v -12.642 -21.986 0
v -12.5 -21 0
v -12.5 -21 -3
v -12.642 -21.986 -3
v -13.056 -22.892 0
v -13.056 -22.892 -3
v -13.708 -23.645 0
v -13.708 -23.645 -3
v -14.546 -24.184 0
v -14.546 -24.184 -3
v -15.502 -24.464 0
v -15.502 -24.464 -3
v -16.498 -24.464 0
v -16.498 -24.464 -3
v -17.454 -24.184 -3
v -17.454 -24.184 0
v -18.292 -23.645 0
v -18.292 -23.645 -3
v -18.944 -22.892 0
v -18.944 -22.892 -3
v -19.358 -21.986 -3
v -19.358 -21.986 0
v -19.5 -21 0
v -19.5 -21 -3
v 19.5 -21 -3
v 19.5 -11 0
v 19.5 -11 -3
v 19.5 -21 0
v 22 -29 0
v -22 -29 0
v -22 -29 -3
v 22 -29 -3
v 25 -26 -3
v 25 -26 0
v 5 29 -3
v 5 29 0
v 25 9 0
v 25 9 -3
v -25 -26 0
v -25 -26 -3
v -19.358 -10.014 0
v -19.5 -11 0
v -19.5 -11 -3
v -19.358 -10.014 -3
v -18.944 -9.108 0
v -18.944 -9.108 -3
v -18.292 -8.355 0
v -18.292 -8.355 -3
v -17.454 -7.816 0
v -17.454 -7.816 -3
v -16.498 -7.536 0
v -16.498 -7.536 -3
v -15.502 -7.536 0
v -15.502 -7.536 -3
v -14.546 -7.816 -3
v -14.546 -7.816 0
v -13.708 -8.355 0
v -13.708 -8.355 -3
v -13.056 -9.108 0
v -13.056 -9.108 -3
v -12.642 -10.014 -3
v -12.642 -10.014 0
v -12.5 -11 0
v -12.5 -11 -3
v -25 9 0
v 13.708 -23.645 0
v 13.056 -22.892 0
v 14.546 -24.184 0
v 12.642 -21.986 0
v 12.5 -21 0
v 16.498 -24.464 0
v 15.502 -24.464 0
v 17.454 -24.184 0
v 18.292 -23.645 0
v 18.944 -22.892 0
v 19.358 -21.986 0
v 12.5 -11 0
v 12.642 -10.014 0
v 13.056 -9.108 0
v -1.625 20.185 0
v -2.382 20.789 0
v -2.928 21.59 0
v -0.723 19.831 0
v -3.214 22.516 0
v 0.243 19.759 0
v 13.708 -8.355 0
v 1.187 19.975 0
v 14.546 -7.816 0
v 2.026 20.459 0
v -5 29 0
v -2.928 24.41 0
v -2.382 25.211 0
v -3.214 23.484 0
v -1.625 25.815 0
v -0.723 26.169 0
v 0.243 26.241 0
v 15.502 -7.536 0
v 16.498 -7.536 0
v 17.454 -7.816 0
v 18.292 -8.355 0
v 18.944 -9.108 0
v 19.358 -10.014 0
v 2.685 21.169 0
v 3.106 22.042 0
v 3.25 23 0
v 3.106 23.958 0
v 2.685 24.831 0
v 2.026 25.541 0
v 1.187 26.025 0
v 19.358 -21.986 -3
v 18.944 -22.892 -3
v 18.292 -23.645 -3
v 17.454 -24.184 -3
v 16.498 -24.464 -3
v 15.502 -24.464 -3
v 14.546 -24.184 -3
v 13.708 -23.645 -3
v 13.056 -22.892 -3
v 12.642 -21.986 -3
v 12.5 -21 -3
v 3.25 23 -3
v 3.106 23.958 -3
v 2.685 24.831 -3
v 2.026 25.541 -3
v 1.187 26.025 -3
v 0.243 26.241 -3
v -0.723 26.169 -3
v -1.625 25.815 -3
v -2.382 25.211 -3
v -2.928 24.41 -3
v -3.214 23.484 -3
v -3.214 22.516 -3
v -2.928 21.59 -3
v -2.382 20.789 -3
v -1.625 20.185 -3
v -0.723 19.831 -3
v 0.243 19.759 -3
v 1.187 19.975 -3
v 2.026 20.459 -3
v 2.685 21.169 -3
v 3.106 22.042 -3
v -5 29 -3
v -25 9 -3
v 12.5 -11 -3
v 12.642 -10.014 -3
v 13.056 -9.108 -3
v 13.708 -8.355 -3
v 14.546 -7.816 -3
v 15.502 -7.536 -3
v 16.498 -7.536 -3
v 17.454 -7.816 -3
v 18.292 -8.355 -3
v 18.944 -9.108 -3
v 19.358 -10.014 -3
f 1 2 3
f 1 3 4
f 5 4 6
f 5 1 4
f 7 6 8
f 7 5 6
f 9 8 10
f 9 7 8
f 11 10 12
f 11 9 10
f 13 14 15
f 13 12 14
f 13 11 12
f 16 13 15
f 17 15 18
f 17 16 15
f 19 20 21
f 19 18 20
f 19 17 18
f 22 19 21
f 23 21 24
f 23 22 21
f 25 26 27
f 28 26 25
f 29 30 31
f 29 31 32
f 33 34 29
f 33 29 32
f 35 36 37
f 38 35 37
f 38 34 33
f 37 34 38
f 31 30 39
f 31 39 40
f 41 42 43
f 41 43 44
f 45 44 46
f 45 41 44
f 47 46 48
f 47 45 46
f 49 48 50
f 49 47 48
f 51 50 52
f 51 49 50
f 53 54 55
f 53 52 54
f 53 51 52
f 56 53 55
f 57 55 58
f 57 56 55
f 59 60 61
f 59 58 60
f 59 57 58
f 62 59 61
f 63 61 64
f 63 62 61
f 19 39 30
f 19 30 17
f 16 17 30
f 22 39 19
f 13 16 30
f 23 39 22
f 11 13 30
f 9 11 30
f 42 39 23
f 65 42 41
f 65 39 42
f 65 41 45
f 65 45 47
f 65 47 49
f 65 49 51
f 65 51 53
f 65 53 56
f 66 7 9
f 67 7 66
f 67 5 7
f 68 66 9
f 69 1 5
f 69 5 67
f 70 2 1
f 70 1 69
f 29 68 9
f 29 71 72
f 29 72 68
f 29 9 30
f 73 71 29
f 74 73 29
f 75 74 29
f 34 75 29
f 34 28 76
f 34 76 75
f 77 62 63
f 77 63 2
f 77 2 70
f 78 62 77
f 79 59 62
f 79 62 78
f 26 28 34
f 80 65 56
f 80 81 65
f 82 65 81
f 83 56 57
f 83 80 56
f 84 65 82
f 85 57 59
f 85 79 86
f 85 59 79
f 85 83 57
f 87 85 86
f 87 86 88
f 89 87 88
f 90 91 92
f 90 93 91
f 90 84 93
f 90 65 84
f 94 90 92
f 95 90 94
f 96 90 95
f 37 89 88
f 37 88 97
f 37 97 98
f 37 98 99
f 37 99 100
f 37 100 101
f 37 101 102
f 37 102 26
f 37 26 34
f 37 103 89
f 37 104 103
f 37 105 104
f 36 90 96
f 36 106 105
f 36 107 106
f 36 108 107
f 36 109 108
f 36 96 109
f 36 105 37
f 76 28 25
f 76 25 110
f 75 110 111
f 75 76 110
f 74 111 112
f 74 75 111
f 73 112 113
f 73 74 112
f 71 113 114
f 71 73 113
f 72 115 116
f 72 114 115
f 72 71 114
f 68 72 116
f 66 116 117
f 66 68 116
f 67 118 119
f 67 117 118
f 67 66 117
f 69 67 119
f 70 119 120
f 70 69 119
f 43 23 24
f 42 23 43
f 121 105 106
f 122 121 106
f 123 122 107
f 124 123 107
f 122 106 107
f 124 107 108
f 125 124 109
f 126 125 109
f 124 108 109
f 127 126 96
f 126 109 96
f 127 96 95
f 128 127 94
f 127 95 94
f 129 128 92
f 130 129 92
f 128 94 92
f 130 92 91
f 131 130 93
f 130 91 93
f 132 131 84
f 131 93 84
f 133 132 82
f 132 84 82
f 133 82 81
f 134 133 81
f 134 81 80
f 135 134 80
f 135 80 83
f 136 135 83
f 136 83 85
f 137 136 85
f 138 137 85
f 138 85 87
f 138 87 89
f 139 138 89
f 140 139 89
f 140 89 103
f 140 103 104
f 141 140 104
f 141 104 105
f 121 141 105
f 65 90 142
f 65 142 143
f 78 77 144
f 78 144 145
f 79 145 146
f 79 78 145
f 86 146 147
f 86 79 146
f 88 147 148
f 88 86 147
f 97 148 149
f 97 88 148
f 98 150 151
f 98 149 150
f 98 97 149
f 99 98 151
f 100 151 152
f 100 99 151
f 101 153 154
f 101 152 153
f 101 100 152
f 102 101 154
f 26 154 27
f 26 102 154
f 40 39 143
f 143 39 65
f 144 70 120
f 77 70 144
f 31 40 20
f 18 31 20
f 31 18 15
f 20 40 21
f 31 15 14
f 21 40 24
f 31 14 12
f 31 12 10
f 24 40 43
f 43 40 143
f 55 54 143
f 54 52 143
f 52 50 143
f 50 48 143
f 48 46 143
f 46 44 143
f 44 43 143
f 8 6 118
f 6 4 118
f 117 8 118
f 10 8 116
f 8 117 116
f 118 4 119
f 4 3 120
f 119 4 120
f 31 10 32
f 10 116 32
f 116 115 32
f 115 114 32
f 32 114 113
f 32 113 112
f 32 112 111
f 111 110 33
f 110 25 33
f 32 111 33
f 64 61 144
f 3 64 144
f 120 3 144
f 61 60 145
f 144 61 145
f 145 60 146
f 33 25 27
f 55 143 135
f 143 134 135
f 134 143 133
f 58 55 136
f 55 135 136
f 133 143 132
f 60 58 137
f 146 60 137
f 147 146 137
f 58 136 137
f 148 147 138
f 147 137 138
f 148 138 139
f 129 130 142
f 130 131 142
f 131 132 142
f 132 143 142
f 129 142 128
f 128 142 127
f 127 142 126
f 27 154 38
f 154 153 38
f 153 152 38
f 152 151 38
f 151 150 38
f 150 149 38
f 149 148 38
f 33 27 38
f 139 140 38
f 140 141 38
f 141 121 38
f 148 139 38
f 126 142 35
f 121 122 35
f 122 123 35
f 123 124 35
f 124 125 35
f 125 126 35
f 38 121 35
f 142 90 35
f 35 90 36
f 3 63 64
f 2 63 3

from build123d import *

# Parameters (mm, degrees)
SKETCH_1_W             = 50
SKETCH_1_H             = 58
SM_BASE_FLANGE_1_DEPTH = 3
SKETCH_2_R             = 3.25
CUT_EXTRUDE_1_DEPTH    = 10
HOLE_WIZARD_7_0_7_1_D  = 7
CHAMFER_1_SIZE         = 3
CUT_EXTRUDE_2_DEPTH    = 10
CUT_EXTRUDE_3_DEPTH    = 10


# Sheet-metal steps are written as plain solids
with BuildPart() as part:
    # Sketch 1 → 基体-法兰1 (new body)
    with BuildSketch(Plane.XY):
        Rectangle(SKETCH_1_W, SKETCH_1_H)
    extrude(amount=-SM_BASE_FLANGE_1_DEPTH)

    # Sketch 2 → 切除-拉伸1 (cut)
    with BuildSketch(Plane.XY):
        with Locations((0, 23)):
            Circle(SKETCH_2_R)
    extrude(amount=-CUT_EXTRUDE_1_DEPTH, mode=Mode.SUBTRACT)

    # Ø7.0 (7) 直径孔1 (through all)
    with Locations(Plane.XY):
        with Locations((-16, -11.5), (16, -11.5)):
            Hole(HOLE_WIZARD_7_0_7_1_D / 2)

    # 倒角1
    chamfer_1_edges = [part.edges().sort_by_distance(p)[0] for p in [
        (25, -29, -1.5),
        (-25, -29, -1.5),
    ]]
    chamfer(chamfer_1_edges, length=CHAMFER_1_SIZE)

    # 草图5 → 切除-拉伸2 (cut)
    with BuildSketch(Plane.XY):
        Polygon((-5, 29), (-25, 9), (-25, 29), align=None)
        Polygon((25, 29), (5, 29), (25, 9), align=None)
    extrude(amount=-CUT_EXTRUDE_2_DEPTH, mode=Mode.SUBTRACT)

    # 草图7 → 切除-拉伸3 (cut)
    with BuildSketch(Plane.XY):
        with BuildLine():
            Line((-19.5, -21), (-19.5, -11))
            ThreePointArc((-19.5, -11), (-16, -7.5), (-12.5, -11))
            Line((-12.5, -11), (-12.5, -21))
            ThreePointArc((-12.5, -21), (-16, -24.5), (-19.5, -21))
        make_face()
        with BuildLine():
            Line((12.5, -21), (12.5, -11))
            ThreePointArc((12.5, -11), (16, -7.5), (19.5, -11))
            Line((19.5, -11), (19.5, -21))
            ThreePointArc((19.5, -21), (16, -24.5), (12.5, -21))
        make_face()
    extrude(amount=-CUT_EXTRUDE_3_DEPTH, mode=Mode.SUBTRACT)


solid = part.part
